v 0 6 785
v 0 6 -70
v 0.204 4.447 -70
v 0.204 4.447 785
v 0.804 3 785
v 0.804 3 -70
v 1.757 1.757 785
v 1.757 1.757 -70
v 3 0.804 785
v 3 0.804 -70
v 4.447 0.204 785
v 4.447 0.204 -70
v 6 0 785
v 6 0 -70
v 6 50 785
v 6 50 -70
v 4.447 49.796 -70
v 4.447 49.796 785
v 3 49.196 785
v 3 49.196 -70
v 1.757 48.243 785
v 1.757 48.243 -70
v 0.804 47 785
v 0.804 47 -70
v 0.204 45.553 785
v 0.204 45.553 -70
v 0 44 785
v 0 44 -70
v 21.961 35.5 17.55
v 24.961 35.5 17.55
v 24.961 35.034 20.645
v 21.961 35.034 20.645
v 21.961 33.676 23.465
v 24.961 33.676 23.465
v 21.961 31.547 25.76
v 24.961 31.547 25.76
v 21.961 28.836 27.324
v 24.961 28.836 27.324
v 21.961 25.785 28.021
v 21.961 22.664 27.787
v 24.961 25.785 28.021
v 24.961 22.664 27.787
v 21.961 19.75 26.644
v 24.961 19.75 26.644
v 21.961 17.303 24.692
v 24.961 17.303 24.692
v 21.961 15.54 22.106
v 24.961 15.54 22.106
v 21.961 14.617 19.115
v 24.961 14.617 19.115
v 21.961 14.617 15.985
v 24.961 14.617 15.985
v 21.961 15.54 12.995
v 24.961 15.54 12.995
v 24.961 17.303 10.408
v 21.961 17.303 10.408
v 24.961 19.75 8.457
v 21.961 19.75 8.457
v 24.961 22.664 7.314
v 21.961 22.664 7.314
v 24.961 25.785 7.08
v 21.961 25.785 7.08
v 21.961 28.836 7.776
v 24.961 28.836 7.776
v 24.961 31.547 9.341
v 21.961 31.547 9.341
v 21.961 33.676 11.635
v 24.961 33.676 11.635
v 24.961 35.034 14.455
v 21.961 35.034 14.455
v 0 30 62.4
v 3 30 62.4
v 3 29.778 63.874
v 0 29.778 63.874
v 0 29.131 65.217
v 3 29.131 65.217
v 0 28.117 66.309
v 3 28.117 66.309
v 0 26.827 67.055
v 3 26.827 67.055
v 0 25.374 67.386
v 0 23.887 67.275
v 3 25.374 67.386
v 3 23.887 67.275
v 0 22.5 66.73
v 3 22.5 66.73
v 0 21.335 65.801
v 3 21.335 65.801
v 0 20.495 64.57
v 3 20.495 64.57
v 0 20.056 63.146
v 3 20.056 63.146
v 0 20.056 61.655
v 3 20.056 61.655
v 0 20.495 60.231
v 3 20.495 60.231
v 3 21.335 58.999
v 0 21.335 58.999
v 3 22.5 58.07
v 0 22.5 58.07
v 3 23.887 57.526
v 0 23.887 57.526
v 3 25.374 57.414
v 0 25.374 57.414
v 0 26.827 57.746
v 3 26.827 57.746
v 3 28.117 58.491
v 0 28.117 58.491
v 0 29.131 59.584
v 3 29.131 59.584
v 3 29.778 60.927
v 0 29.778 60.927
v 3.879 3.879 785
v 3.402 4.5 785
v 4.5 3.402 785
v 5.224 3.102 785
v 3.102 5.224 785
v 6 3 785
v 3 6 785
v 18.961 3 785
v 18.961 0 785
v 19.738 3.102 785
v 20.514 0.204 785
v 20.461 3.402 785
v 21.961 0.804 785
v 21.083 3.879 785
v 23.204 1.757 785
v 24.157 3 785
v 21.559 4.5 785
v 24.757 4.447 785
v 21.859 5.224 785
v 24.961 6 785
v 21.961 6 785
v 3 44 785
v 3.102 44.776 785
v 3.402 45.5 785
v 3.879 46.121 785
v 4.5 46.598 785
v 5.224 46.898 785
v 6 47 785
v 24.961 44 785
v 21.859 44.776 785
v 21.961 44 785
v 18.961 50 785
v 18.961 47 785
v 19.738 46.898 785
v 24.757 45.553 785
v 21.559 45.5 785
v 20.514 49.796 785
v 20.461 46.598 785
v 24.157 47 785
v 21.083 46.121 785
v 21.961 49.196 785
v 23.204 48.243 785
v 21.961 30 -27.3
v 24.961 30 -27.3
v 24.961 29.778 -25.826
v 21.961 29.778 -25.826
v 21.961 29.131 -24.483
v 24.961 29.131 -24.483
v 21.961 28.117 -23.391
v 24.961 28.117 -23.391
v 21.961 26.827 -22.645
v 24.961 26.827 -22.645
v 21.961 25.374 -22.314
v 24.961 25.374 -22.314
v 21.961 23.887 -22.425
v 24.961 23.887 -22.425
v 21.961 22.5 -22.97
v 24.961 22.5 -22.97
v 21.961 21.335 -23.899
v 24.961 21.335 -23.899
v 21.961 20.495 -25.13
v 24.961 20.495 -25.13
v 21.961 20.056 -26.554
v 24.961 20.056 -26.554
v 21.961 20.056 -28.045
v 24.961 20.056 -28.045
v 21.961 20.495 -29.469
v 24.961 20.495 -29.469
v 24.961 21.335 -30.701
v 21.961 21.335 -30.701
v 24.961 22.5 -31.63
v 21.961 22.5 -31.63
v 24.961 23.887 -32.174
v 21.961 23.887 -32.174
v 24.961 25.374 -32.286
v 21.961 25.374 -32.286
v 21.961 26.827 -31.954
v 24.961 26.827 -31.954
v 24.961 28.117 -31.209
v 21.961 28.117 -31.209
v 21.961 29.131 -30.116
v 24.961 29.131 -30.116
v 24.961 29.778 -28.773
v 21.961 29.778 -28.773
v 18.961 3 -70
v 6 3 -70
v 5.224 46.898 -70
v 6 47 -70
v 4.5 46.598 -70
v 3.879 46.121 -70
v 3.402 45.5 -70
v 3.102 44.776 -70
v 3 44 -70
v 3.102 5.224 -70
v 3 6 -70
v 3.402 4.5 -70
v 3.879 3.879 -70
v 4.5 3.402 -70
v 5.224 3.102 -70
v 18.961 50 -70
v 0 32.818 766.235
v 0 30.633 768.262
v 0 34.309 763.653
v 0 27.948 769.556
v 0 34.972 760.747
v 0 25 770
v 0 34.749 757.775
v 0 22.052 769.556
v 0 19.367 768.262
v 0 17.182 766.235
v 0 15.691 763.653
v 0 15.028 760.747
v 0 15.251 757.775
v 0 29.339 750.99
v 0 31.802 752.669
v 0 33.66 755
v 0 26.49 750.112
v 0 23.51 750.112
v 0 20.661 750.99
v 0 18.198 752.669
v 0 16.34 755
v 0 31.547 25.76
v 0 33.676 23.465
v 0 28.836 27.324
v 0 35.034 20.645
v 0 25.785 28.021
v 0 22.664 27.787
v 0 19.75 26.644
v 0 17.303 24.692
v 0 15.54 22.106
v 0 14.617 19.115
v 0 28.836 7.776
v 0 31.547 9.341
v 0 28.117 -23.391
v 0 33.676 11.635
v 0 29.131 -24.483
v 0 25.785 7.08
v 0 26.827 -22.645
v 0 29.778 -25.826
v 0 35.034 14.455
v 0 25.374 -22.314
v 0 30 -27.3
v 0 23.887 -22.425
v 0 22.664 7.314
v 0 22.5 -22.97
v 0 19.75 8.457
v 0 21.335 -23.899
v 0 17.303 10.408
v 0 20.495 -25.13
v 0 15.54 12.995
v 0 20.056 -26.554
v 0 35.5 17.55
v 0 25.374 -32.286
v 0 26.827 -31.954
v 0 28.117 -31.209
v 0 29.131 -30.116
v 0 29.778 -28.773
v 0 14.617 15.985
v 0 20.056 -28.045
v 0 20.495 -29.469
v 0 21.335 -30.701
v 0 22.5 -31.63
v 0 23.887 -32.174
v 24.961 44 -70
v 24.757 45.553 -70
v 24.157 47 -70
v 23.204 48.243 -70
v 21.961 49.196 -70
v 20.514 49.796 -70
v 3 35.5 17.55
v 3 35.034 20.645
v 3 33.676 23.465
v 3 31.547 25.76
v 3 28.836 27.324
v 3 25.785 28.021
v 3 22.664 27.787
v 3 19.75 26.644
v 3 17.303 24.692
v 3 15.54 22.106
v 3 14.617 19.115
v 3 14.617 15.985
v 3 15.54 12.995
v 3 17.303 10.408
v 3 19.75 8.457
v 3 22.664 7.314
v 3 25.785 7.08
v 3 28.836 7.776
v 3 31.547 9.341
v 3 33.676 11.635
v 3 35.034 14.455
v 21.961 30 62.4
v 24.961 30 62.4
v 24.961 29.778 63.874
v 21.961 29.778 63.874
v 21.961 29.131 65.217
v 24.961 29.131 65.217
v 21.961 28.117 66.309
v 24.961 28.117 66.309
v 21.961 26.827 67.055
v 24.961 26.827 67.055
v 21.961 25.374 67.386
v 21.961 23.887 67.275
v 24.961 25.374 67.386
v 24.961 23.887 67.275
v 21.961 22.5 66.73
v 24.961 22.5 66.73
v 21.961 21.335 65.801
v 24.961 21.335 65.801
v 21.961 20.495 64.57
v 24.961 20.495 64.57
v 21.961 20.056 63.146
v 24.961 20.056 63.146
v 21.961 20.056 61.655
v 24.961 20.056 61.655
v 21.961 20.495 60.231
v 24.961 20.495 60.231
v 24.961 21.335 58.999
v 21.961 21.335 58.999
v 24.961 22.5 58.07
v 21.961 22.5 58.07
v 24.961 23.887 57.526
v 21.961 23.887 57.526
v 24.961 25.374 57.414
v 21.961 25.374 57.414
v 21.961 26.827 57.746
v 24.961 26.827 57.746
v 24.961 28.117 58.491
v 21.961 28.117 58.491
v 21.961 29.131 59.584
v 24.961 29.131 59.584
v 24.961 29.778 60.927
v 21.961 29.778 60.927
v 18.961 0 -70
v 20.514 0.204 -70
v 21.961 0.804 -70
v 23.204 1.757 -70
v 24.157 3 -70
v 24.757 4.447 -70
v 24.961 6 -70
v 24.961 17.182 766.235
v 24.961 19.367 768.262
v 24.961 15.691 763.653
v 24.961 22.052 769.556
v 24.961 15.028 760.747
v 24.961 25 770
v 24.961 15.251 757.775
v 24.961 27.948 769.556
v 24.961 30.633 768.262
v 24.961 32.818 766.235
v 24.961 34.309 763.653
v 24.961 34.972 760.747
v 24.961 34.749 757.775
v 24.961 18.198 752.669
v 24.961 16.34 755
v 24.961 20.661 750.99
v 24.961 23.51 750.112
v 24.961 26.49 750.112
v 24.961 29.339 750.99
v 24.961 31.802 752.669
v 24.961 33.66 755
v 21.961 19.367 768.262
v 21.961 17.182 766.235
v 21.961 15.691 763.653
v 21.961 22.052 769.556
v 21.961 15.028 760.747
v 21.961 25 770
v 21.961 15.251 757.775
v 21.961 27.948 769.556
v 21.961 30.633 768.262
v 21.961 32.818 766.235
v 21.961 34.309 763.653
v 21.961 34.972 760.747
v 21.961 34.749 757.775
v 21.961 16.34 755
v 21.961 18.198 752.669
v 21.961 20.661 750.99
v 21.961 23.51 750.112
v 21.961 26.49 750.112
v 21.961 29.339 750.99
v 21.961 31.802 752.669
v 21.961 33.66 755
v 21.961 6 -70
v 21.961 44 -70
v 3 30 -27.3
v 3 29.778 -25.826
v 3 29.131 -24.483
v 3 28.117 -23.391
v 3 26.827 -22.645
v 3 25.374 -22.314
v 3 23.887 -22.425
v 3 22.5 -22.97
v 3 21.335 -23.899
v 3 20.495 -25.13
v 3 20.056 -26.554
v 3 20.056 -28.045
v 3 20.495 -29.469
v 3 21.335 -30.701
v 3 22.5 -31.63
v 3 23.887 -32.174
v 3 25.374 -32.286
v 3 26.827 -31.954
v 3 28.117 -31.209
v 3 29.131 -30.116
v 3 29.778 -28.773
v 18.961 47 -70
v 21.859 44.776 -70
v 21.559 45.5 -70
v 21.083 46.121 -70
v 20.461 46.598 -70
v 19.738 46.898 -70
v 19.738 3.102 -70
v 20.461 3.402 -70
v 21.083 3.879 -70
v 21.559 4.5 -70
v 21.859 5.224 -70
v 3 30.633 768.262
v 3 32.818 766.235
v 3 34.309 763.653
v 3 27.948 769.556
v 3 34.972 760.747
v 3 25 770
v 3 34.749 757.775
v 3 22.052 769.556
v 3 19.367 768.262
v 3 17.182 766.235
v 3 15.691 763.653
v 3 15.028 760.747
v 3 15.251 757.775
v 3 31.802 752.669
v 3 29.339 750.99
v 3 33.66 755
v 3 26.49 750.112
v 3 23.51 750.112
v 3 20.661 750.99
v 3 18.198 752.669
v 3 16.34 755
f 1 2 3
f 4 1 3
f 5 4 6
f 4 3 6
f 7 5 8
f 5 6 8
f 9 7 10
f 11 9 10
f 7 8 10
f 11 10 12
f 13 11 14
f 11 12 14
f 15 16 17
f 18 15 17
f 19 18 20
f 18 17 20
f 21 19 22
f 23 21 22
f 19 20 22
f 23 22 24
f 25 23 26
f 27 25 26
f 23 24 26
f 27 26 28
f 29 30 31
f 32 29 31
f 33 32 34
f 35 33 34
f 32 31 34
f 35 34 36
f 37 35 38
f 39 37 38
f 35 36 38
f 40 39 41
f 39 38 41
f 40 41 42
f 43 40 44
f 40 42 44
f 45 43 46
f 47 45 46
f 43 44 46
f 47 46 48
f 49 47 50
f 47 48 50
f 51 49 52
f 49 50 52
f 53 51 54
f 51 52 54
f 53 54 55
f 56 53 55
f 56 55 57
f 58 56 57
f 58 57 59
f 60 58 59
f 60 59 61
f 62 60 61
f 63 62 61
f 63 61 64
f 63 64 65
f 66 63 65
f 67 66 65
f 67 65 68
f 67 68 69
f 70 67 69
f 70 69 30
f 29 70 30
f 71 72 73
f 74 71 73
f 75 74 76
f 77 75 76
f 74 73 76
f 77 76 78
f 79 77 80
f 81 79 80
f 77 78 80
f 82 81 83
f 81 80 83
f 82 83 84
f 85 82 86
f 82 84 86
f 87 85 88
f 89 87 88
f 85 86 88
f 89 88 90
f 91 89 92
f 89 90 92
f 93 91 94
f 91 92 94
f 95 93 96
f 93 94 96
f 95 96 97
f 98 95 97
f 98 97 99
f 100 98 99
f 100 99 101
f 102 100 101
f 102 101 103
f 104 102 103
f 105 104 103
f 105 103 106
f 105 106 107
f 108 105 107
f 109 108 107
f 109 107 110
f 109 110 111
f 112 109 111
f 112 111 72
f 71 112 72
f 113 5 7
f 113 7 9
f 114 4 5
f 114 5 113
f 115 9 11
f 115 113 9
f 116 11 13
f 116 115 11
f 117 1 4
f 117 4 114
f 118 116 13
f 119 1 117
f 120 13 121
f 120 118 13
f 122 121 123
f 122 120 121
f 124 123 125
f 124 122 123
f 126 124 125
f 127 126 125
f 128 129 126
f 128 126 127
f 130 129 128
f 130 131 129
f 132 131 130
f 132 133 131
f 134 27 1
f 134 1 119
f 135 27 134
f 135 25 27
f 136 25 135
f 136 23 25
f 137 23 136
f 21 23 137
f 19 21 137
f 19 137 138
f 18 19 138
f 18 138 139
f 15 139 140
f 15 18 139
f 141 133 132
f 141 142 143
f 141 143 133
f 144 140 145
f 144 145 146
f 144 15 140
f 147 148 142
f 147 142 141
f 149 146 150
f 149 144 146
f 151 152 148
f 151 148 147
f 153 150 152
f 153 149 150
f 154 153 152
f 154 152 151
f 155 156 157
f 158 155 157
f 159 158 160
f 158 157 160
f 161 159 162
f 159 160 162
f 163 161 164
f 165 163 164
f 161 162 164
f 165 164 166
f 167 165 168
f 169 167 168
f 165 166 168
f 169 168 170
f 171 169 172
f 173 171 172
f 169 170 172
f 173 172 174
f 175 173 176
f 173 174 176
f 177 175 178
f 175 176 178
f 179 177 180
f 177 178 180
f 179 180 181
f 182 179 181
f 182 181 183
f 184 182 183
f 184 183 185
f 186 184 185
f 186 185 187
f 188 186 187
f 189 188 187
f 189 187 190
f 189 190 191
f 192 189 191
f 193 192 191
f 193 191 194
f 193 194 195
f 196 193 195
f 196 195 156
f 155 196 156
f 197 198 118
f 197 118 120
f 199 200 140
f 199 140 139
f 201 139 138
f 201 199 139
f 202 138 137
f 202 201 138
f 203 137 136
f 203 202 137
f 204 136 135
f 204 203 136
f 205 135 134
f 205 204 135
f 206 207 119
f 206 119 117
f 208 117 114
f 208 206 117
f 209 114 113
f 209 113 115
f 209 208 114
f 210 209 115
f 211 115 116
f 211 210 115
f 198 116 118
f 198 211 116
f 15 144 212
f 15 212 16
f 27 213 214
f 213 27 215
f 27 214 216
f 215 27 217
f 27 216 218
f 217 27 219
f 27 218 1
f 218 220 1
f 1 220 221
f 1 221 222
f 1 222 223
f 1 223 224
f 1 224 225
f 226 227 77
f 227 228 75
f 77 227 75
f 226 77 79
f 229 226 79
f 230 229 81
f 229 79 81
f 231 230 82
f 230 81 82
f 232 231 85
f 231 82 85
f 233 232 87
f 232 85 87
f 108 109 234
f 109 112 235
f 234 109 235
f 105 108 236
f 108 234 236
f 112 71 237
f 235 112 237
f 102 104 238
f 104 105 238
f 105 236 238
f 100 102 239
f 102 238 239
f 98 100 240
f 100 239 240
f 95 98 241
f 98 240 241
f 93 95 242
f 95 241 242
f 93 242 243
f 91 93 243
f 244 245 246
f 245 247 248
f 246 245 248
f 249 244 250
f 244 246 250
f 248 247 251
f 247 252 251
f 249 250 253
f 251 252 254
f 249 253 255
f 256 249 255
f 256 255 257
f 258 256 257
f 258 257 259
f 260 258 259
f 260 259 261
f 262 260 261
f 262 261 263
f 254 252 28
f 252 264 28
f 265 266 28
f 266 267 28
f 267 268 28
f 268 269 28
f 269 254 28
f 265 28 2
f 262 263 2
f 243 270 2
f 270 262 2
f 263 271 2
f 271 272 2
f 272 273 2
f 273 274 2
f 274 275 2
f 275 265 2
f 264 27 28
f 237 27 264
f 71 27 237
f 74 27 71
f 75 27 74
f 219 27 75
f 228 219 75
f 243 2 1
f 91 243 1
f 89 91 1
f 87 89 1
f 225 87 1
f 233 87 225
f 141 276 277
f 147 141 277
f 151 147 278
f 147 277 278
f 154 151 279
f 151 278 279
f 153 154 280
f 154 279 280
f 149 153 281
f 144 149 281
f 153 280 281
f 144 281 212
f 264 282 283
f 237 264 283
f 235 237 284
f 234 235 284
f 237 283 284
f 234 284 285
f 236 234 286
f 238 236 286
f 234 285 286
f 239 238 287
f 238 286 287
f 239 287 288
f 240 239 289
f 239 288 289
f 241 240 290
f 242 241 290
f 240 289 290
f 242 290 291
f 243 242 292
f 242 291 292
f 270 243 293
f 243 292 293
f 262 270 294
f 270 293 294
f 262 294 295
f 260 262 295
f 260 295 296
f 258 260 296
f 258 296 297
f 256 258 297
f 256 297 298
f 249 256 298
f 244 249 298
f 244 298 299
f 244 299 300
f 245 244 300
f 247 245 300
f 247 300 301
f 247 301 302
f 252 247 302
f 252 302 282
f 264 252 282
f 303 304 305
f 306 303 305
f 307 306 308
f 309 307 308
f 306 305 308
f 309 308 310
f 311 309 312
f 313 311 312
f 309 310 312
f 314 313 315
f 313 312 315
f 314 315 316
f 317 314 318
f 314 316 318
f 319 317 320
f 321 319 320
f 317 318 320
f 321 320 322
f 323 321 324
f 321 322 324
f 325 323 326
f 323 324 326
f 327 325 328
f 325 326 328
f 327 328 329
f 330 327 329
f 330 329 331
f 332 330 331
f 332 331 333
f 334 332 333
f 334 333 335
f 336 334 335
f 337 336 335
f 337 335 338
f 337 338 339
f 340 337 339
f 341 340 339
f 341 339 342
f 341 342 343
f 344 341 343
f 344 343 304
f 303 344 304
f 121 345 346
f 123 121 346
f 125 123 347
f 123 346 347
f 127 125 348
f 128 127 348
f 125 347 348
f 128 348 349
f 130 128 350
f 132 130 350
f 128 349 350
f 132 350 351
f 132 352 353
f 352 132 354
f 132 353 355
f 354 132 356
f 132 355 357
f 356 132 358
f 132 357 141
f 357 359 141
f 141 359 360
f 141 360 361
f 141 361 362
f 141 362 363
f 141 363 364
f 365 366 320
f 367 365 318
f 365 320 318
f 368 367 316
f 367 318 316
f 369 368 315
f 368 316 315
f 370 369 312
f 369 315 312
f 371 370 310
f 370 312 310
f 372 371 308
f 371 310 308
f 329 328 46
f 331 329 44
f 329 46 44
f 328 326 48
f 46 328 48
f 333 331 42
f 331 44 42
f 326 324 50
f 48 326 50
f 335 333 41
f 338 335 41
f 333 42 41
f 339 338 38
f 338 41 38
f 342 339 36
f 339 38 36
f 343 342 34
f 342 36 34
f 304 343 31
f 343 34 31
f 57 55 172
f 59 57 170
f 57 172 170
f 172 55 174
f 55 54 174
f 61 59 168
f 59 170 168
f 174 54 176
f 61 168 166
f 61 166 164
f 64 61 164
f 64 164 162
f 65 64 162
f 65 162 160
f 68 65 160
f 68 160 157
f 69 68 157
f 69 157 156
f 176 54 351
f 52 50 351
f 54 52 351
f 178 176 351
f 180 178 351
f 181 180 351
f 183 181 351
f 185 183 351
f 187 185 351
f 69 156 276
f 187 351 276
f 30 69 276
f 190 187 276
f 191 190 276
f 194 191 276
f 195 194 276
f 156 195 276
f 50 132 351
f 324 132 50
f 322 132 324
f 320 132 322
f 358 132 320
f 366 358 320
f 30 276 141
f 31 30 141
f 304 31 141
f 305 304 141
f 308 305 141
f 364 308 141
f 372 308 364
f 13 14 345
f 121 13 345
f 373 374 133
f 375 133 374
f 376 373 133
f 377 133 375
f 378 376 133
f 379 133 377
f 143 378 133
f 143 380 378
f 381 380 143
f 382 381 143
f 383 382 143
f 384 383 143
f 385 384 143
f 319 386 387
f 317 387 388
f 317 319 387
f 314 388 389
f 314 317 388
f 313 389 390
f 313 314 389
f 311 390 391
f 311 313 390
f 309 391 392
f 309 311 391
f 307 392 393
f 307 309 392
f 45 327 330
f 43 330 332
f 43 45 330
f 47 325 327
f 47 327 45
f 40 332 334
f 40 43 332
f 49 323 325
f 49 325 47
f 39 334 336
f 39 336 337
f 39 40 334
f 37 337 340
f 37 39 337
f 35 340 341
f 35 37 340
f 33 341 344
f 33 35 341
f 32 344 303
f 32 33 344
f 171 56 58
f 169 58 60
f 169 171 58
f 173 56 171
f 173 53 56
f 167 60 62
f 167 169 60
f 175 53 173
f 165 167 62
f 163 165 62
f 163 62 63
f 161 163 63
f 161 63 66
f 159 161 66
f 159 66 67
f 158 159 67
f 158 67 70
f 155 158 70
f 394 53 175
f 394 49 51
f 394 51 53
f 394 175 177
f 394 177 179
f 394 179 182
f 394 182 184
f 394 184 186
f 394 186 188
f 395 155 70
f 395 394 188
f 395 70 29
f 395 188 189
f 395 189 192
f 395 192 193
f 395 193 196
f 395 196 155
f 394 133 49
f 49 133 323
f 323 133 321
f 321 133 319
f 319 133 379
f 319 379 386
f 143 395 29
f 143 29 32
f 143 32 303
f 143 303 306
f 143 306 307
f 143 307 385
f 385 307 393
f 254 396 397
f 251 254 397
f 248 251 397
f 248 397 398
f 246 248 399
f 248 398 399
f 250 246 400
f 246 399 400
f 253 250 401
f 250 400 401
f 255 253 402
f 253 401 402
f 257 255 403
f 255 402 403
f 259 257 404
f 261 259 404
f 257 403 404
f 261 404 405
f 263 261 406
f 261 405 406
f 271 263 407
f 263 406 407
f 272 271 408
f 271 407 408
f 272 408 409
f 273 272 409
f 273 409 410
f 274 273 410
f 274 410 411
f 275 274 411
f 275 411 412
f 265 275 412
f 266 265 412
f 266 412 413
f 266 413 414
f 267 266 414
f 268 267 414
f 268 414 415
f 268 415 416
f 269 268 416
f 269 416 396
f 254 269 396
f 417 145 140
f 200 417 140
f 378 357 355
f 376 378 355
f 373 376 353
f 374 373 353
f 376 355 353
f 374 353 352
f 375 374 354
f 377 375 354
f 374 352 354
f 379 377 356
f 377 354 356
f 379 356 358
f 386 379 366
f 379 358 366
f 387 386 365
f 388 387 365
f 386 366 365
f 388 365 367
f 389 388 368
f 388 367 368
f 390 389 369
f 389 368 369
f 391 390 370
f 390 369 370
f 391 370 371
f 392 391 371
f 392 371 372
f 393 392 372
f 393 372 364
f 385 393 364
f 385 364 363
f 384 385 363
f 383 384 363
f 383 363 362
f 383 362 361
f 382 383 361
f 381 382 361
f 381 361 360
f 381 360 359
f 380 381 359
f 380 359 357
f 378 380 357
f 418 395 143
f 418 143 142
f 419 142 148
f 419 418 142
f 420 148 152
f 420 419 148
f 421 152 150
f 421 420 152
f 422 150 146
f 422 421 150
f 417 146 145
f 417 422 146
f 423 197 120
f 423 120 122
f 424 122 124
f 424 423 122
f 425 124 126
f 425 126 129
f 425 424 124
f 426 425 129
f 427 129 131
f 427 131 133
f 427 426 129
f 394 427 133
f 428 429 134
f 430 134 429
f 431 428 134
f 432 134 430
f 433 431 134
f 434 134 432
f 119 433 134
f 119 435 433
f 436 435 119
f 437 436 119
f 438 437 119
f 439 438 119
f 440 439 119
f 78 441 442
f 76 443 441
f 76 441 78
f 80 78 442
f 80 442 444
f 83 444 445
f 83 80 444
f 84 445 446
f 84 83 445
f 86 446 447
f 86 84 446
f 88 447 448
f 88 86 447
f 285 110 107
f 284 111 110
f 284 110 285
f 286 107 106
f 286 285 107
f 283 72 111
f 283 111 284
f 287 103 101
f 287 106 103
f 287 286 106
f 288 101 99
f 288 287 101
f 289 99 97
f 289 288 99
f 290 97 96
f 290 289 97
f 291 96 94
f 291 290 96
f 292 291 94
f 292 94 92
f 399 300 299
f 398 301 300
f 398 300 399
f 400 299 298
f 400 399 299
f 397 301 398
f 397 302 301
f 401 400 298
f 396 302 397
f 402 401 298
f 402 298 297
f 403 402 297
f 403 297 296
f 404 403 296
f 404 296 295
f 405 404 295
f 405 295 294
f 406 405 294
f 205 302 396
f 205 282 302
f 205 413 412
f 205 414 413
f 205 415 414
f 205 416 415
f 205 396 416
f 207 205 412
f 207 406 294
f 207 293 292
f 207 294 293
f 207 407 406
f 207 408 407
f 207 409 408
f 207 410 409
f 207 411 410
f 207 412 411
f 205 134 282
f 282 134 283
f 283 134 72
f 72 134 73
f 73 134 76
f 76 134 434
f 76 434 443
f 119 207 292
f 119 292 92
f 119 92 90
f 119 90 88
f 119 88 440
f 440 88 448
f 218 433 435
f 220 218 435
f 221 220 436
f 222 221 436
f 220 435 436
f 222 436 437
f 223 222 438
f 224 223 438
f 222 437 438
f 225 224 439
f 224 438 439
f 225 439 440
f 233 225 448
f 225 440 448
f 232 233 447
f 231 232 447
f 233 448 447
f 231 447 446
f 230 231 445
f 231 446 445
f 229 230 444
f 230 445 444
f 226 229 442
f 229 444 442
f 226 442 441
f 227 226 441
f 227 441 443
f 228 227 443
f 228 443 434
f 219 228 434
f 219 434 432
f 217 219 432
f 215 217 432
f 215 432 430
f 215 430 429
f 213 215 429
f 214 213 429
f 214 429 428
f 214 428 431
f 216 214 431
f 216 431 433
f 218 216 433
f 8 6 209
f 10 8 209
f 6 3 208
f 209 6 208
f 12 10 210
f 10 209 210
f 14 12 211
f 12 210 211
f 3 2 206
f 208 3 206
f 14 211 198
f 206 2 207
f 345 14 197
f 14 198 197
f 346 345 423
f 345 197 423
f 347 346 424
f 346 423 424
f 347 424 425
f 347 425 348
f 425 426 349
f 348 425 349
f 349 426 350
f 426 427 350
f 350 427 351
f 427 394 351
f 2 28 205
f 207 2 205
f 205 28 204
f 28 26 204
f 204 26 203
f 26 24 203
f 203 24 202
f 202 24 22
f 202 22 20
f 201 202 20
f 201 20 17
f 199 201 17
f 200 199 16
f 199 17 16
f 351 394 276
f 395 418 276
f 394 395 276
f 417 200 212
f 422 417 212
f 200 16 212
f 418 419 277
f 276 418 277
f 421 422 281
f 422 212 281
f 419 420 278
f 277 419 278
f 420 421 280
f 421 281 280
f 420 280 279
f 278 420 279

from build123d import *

# Parameters (mm, degrees)
BOSS_EXTRUDE1_DEPTH      = 785
BOSS_EXTRUDE1_DEPTH_BACK = 70
SKETCH3_R                = 10.5
SKETCH3_R_2              = 5
CUT_EXTRUDE1_DEPTH       = 787.986697046


with BuildPart() as part:
    # Sketch1 → Boss-Extrude1 (new, two sides: drawn at the far end of the back side and taken through both)
    with BuildSketch(Plane.XY.offset(-BOSS_EXTRUDE1_DEPTH_BACK)):
        with BuildLine():
            Line((0, 44), (0, 6))
            ThreePointArc((0, 6), (1.757359313, 1.757359313), (6, 0))
            Line((6, 0), (18.96119643, 0))
            ThreePointArc((18.96119643, 0), (23.203837117, 1.757359313), (24.96119643, 6))
            Line((24.96119643, 6), (24.96119643, 44))
            ThreePointArc((24.96119643, 44), (23.203837117, 48.242640687), (18.96119643, 50))
            Line((18.96119643, 50), (6, 50))
            ThreePointArc((6, 50), (1.757359313, 48.242640687), (0, 44))
        make_face()
        with BuildLine():
            Line((3, 44), (3, 6))
            ThreePointArc((3, 6), (3.878679656, 3.878679656), (6, 3))
            Line((6, 3), (18.96119643, 3))
            ThreePointArc((18.96119643, 3), (21.082516774, 3.878679656), (21.96119643, 6))
            Line((21.96119643, 6), (21.96119643, 44))
            ThreePointArc((21.96119643, 44), (21.082516774, 46.121320344), (18.96119643, 47))
            Line((18.96119643, 47), (6, 47))
            ThreePointArc((6, 47), (3.878679656, 46.121320344), (3, 44))
        make_face(mode=Mode.SUBTRACT)
    extrude(amount=BOSS_EXTRUDE1_DEPTH + BOSS_EXTRUDE1_DEPTH_BACK)

    # Sketch3 → Cut-Extrude1 (cut, through all)
    with BuildSketch(Plane(origin=(24.96119643, 0, 0), x_dir=(0, 0, -1), z_dir=(1, 0, 0))):
        with Locations(Location((-17.550291159, 25, 0), (0, 0, 90))):
            Circle(SKETCH3_R)
        with Locations(Location((-62.400291159, 25, 0), (0, 0, 90))):
            Circle(SKETCH3_R_2)
        with BuildLine():
            ThreePointArc((-750, 25), (-760, 35), (-770, 25))
            Line((-770, 25), (-760, 25))
            Line((-760, 25), (-750, 25))
        make_face()
        with BuildLine():
            Line((-760, 25), (-770, 25))
            ThreePointArc((-770, 25), (-760, 15), (-750, 25))
            Line((-750, 25), (-760, 25))
        make_face()
        with Locations(Location((27.299708841, 25, 0), (0, 0, 90))):
            Circle(SKETCH3_R_2)
    extrude(amount=-CUT_EXTRUDE1_DEPTH, mode=Mode.SUBTRACT)


solid = part.part
